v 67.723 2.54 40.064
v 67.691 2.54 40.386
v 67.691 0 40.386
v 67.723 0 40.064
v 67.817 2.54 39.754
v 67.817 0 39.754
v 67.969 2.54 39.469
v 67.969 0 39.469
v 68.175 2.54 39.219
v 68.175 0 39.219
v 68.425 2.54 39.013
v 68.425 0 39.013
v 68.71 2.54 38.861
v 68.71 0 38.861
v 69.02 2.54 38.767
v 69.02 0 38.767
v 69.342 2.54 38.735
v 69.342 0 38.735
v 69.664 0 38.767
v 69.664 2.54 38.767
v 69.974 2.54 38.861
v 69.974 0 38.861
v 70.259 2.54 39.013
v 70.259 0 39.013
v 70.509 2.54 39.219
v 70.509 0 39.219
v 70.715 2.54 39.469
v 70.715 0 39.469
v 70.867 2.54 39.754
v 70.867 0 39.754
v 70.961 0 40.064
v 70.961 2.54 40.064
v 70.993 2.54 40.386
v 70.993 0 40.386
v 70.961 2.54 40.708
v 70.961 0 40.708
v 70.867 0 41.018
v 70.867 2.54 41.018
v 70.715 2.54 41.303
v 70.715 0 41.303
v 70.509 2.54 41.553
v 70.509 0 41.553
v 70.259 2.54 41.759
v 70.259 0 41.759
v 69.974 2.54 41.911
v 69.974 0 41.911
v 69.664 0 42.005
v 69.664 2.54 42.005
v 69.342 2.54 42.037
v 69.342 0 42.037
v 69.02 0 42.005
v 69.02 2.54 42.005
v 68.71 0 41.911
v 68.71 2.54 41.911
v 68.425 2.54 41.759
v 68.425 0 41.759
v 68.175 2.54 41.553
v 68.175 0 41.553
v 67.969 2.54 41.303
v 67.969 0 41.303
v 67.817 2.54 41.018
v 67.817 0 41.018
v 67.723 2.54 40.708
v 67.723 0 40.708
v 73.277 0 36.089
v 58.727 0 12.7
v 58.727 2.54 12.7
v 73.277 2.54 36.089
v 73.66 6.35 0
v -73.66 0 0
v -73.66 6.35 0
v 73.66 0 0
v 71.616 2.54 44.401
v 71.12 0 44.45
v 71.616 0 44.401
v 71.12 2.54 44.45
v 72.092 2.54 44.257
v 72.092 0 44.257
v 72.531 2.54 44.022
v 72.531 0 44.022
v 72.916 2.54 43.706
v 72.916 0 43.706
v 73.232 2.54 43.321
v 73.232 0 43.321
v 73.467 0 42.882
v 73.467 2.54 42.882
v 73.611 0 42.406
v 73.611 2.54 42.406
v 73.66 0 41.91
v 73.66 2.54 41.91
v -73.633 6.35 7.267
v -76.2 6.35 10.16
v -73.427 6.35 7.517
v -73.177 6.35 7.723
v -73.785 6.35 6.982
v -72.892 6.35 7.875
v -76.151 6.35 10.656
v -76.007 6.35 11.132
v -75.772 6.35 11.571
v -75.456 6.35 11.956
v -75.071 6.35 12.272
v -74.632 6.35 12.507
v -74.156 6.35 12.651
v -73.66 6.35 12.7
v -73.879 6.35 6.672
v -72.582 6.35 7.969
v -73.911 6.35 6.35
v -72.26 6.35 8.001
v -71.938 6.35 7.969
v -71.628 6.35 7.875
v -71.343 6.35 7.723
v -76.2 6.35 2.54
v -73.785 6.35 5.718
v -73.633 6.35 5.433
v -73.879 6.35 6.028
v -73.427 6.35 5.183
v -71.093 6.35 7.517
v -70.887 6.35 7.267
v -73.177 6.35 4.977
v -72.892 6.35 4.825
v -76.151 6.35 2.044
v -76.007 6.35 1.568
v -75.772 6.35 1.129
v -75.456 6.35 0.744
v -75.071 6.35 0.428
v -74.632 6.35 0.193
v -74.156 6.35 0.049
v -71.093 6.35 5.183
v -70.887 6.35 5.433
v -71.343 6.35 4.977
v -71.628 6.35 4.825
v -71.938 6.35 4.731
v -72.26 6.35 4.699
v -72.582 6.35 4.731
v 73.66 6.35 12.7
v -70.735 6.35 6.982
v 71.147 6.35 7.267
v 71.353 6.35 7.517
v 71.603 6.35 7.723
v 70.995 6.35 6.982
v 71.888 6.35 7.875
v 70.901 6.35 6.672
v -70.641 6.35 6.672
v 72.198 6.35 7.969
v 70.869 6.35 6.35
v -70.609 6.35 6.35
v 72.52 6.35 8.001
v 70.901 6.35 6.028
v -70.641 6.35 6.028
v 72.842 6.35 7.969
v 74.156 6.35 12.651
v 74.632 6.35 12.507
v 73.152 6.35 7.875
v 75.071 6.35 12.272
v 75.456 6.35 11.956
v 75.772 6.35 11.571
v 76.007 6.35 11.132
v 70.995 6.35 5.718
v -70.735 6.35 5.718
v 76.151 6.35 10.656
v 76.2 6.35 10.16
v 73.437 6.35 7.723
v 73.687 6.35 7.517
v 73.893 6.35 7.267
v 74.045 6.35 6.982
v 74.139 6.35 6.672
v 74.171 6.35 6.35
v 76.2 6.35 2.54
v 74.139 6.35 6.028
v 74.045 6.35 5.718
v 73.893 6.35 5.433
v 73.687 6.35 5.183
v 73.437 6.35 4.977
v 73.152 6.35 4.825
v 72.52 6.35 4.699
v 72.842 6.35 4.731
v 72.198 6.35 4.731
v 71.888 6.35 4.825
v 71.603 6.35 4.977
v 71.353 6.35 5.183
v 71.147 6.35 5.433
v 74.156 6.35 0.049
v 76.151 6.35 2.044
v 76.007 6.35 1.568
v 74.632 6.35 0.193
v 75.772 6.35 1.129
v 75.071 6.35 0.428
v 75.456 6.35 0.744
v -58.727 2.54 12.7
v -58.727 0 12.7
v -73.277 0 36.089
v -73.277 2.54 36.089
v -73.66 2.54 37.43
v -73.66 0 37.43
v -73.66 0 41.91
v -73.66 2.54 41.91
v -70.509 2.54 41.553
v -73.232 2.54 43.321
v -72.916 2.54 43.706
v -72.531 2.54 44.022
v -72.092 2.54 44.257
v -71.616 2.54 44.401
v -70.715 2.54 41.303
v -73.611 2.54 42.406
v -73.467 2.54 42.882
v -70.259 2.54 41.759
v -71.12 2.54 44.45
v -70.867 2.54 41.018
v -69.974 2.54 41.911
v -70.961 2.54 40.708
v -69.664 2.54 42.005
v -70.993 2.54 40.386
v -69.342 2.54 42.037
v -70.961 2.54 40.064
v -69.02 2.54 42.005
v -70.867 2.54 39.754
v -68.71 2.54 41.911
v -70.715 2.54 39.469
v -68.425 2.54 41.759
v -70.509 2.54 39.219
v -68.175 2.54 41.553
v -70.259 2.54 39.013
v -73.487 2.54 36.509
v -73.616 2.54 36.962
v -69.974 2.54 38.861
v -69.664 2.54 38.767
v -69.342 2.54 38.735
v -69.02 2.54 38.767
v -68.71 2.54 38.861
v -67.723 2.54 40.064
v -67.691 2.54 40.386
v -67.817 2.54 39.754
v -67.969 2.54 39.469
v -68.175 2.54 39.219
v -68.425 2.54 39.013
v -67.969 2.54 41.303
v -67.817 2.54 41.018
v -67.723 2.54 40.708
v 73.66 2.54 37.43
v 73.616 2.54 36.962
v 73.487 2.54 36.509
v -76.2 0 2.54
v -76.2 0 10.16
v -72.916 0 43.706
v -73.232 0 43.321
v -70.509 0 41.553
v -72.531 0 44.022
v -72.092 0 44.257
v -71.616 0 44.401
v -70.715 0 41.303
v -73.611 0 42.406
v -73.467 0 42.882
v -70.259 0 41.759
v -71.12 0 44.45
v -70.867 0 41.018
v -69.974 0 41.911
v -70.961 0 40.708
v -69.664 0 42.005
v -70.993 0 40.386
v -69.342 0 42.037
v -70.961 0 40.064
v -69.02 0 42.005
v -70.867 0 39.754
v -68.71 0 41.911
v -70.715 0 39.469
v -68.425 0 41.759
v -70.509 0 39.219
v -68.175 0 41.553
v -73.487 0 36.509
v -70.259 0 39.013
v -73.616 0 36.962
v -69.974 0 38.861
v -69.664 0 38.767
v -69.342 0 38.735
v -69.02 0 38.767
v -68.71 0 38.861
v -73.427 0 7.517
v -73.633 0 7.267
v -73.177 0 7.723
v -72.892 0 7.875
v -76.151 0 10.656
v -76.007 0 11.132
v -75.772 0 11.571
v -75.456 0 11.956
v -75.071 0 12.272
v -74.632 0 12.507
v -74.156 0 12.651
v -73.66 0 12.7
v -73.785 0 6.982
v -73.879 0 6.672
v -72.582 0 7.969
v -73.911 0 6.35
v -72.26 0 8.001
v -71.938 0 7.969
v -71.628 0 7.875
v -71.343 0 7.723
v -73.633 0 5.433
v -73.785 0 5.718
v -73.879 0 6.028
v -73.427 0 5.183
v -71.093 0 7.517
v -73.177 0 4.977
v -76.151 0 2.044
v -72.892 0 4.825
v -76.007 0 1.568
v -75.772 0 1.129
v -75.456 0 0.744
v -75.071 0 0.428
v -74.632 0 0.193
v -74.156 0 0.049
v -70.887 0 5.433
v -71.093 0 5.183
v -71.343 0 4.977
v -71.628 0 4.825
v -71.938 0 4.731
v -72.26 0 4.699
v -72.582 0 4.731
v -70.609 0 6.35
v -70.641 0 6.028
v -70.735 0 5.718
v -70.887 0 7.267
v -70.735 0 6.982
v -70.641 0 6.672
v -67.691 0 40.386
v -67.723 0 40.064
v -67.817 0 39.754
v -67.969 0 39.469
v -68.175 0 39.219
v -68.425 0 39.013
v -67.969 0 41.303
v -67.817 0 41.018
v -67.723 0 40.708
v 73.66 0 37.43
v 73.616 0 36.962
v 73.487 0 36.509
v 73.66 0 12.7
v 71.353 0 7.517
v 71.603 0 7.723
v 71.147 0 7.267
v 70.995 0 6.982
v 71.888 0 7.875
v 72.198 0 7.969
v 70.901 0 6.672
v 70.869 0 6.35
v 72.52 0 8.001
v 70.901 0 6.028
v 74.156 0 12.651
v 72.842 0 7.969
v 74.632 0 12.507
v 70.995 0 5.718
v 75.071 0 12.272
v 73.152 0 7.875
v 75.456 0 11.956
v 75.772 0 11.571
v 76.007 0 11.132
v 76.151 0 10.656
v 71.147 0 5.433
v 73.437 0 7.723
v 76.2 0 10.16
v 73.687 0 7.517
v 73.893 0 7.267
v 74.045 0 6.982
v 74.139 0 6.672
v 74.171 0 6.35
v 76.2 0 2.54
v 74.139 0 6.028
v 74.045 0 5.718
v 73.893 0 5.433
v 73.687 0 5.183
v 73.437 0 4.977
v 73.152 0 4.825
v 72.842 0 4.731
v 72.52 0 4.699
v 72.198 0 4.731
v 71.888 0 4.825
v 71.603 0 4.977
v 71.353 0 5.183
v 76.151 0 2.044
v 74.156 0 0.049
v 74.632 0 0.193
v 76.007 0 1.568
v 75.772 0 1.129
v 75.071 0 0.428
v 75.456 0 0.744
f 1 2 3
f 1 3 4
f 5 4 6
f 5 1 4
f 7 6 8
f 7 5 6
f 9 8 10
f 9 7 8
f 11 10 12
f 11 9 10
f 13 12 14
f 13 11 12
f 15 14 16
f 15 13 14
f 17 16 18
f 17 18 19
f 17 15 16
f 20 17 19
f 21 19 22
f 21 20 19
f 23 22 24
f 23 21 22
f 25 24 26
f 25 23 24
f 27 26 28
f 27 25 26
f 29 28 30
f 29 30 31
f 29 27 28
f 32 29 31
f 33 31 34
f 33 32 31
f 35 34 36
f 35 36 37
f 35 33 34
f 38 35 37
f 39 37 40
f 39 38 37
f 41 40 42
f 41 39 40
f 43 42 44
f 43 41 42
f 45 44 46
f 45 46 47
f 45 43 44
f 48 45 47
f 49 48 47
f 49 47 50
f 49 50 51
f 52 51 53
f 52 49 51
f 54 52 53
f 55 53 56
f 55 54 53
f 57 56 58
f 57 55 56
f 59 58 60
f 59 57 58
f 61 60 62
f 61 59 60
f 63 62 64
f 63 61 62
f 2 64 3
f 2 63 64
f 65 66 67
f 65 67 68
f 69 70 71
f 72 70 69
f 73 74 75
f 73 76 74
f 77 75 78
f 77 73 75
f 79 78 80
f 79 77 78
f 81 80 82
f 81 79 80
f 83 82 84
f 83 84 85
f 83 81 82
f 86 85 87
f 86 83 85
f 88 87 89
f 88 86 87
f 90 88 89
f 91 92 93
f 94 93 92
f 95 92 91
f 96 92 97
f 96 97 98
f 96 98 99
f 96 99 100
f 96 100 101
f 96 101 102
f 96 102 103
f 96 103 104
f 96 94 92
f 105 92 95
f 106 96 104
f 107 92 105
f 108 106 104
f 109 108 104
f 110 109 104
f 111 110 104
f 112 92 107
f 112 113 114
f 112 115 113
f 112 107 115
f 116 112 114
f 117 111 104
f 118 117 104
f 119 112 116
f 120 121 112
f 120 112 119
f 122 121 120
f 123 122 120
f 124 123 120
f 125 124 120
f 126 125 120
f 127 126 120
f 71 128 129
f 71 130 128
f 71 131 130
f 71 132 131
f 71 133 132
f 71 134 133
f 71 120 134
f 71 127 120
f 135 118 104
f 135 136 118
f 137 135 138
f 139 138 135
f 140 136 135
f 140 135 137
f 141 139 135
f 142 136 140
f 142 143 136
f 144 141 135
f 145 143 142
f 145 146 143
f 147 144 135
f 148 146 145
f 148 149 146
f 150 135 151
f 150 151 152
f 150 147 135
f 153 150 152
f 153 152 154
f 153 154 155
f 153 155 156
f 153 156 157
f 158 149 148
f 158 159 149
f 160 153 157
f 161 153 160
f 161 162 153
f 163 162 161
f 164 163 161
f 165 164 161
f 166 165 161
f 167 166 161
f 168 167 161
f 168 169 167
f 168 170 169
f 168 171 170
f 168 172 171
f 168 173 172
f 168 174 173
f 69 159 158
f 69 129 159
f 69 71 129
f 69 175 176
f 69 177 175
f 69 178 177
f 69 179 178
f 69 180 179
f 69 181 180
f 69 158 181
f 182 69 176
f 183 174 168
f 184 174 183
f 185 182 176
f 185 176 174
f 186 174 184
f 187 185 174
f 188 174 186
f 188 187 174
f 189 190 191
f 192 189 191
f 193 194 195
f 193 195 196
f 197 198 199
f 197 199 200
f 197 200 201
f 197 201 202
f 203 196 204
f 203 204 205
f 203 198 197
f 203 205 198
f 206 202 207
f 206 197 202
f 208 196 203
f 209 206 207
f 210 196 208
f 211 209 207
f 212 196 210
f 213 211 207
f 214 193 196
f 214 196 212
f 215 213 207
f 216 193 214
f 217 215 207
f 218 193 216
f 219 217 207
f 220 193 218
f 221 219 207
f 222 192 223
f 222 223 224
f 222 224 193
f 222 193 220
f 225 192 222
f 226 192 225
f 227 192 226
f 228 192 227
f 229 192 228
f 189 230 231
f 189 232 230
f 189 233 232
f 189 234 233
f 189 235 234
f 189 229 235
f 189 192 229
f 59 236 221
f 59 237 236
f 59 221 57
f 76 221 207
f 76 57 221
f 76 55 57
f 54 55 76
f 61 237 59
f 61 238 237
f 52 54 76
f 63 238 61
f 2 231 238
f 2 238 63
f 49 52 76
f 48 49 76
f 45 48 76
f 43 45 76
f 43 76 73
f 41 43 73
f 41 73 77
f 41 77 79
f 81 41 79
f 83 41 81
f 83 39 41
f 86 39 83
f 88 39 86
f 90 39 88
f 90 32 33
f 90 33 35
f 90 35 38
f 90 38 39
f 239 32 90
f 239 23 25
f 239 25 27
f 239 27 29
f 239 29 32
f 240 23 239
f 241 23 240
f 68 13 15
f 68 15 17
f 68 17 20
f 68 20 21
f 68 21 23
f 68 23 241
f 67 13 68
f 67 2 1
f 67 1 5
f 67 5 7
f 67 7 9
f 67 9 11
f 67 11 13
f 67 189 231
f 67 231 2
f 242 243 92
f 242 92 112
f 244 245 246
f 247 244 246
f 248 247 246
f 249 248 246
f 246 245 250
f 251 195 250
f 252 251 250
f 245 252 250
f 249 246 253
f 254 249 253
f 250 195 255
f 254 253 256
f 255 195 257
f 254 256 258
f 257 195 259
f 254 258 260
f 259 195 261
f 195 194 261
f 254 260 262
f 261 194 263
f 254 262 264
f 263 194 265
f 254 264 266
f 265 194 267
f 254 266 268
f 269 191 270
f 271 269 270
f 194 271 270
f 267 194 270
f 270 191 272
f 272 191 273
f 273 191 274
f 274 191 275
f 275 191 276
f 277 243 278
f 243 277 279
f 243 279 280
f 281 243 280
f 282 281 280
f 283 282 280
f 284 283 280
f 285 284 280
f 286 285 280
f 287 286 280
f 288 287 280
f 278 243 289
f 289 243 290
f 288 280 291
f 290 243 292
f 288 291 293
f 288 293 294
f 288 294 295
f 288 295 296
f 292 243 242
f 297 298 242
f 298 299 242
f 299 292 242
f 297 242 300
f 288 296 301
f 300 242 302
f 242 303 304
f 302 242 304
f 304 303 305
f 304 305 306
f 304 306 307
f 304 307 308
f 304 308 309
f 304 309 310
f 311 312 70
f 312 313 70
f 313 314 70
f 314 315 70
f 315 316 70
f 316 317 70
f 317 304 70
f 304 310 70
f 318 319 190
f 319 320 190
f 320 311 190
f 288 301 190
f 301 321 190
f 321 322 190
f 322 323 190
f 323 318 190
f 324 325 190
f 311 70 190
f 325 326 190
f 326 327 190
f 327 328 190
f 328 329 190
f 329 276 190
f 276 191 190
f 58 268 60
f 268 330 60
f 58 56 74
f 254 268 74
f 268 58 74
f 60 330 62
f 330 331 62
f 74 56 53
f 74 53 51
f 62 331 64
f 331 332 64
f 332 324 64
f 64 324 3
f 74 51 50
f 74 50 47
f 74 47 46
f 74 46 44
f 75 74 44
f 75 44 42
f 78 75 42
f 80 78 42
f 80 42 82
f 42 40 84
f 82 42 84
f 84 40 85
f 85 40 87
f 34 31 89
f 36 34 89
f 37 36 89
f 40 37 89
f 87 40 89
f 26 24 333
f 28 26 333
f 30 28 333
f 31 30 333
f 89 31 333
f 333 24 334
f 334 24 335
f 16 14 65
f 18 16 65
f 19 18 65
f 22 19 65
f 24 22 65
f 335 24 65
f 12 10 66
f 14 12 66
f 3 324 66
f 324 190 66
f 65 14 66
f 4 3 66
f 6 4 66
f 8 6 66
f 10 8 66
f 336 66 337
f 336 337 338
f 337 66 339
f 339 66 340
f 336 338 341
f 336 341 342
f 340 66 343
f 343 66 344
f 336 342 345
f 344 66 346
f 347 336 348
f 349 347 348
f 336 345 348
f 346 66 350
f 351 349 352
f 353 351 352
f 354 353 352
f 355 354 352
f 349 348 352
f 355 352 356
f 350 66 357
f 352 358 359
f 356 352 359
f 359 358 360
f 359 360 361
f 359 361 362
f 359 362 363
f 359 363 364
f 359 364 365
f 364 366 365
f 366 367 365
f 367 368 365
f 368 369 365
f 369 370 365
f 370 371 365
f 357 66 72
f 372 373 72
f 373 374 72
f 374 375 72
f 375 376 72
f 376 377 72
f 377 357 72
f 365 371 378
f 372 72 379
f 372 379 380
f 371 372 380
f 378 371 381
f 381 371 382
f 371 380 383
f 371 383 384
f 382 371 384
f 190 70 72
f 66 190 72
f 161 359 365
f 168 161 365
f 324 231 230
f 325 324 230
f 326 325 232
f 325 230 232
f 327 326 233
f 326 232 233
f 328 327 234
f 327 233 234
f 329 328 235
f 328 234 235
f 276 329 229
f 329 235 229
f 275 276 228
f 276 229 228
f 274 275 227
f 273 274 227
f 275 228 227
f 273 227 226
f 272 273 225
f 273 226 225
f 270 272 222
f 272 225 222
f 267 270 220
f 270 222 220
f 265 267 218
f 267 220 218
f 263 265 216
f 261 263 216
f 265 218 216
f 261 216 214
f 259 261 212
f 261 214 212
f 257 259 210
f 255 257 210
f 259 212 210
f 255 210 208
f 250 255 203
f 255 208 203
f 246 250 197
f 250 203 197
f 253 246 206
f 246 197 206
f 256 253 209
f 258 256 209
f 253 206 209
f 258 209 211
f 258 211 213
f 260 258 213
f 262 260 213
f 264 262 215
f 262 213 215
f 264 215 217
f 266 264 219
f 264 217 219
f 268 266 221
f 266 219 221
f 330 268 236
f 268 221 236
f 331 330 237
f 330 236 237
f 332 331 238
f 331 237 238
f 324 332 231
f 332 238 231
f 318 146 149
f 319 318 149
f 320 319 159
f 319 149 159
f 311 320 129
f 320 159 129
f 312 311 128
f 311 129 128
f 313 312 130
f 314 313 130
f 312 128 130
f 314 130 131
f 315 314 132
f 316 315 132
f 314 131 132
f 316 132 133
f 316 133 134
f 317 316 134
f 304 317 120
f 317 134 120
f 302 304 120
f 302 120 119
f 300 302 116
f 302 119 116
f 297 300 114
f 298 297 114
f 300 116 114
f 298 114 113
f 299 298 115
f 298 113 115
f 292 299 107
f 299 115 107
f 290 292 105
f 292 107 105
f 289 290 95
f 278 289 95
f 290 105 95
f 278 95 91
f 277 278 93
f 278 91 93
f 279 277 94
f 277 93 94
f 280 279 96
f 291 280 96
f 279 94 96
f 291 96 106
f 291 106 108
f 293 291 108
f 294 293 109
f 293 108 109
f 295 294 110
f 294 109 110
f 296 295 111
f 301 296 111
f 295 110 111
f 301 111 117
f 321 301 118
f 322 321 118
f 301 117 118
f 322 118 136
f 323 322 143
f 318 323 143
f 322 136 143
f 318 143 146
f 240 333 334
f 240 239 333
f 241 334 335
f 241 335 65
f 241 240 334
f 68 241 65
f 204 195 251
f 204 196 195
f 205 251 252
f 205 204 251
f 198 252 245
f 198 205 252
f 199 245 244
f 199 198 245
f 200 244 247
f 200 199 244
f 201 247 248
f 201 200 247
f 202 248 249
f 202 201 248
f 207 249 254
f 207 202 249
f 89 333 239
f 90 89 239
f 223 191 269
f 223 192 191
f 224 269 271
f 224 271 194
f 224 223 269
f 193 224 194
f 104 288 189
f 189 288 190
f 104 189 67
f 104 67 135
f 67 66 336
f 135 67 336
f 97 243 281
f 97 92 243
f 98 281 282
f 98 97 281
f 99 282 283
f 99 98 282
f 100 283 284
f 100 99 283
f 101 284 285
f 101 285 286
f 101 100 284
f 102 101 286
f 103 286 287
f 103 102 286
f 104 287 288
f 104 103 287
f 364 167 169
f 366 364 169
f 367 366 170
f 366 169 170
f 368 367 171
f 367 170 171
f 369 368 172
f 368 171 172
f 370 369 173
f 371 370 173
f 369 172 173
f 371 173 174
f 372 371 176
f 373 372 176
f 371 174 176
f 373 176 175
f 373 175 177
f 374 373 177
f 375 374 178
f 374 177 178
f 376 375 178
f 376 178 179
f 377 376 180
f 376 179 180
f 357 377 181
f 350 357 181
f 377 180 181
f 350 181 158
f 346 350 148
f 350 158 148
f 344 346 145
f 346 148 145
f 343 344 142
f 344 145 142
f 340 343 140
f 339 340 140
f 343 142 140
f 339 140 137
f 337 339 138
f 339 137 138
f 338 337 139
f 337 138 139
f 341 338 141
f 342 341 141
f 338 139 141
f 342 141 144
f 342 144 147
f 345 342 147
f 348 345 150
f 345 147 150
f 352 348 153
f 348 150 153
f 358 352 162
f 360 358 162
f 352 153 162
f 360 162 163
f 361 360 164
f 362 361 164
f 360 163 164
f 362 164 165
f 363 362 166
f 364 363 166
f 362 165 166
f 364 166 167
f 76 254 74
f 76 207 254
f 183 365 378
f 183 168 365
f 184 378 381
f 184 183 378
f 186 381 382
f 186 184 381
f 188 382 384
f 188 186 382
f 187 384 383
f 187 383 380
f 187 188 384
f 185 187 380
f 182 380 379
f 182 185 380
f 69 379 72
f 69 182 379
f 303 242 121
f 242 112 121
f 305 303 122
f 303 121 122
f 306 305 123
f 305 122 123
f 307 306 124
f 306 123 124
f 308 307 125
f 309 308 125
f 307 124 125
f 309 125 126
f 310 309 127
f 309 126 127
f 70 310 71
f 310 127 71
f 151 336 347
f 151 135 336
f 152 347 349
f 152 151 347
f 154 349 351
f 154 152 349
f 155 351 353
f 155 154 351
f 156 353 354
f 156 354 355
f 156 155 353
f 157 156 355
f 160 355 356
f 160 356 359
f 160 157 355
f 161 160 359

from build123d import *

# Parameters (mm, degrees)
SKETCH1_W           = 152.4
SKETCH1_H           = 12.7
EXTRUDE_THIN1_DEPTH = 6.35
FILLET1_R           = 2.54
SKETCH3_R           = 1.651
CUT_EXTRUDE1_DEPTH  = 6.35
LPATTERN1_COUNT     = 2
LPATTERN1_PITCH     = 144.78
SKETCH4_W           = 147.32
SKETCH4_H           = 2.54
EXTRUDE_THIN2_DEPTH = 31.75
CUT_EXTRUDE2_DEPTH  = 2.54
FILLET2_R           = 2.54
SKETCH7_R           = 1.651
CUT_EXTRUDE3_DEPTH  = 2.54


with BuildPart() as part:
    # Sketch1 → Extrude-Thin1 (new body)
    with BuildSketch(Plane(origin=(0, 0, 0), x_dir=(1, 0, 0), z_dir=(0, 1, 0))):
        with Locations((0, -6.35)):
            Rectangle(SKETCH1_W, SKETCH1_H)
    extrude(amount=EXTRUDE_THIN1_DEPTH)

    # Fillet1
    fillet1_edges = [part.edges().sort_by_distance(p)[0] for p in [
        (-76.2, 3.175, 12.7),
        (-76.2, 3.175, 0),
        (76.2, 3.175, 0),
        (76.2, 3.175, 12.7),
    ]]
    fillet(fillet1_edges, radius=FILLET1_R)

    # Sketch3 → Cut-Extrude1 (cut)
    with BuildSketch(Plane(origin=(0, 6.35, 0), x_dir=(1, 0, 0), z_dir=(0, 1, 0))):
        with Locations((72.520050335, -6.35)):
            Circle(SKETCH3_R)
    cut_extrude1 = extrude(amount=-CUT_EXTRUDE1_DEPTH, mode=Mode.SUBTRACT)

    # LPattern1: Cut-Extrude1 ×2
    with Locations(*[(-i * LPATTERN1_PITCH, 0, 0) for i in range(1, LPATTERN1_COUNT)]):
        add(cut_extrude1, mode=Mode.SUBTRACT)

    # Sketch4 → Extrude-Thin2 (add)
    with BuildSketch(Plane.XY.offset(12.7)):
        with Locations((0, 1.27)):
            Rectangle(SKETCH4_W, SKETCH4_H)
    extrude(amount=EXTRUDE_THIN2_DEPTH)

    # Sketch5 → Cut-Extrude2 (cut)
    with BuildSketch(Plane(origin=(0, 0, 0), x_dir=(-1, 0, 0), z_dir=(0, -1, 0))):
        Polygon((-73.66, -12.7), (-58.727381013, -12.7), (-73.66, -36.704605771), align=None)
    cut_extrude2 = extrude(amount=-CUT_EXTRUDE2_DEPTH, mode=Mode.SUBTRACT)

    # Mirror1: Cut-Extrude2 across plane
    add(cut_extrude2.mirror(Plane(origin=(0, 0, 0), x_dir=(0, 0, 1), z_dir=(1, 0, 0))), mode=Mode.SUBTRACT)

    # Fillet2
    fillet2_edges = [part.edges().sort_by_distance(p)[0] for p in [
        (-73.66, 1.27, 36.704605771),
        (73.66, 1.27, 44.45),
        (-73.66, 1.27, 44.45),
        (73.66, 1.27, 36.704605771),
    ]]
    fillet(fillet2_edges, radius=FILLET2_R)

    # Sketch7 → Cut-Extrude3 (cut)
    with BuildSketch(Plane(origin=(0, 2.54, 0), x_dir=(1, 0, 0), z_dir=(0, 1, 0))):
        with Locations((-69.342, -40.386)):
            Circle(SKETCH7_R)
    cut_extrude3 = extrude(amount=-CUT_EXTRUDE3_DEPTH, mode=Mode.SUBTRACT)

    # Mirror2: Cut-Extrude3 across plane
    add(cut_extrude3.mirror(Plane(origin=(0, 0, 0), x_dir=(0, 0, 1), z_dir=(1, 0, 0))), mode=Mode.SUBTRACT)


solid = part.part
